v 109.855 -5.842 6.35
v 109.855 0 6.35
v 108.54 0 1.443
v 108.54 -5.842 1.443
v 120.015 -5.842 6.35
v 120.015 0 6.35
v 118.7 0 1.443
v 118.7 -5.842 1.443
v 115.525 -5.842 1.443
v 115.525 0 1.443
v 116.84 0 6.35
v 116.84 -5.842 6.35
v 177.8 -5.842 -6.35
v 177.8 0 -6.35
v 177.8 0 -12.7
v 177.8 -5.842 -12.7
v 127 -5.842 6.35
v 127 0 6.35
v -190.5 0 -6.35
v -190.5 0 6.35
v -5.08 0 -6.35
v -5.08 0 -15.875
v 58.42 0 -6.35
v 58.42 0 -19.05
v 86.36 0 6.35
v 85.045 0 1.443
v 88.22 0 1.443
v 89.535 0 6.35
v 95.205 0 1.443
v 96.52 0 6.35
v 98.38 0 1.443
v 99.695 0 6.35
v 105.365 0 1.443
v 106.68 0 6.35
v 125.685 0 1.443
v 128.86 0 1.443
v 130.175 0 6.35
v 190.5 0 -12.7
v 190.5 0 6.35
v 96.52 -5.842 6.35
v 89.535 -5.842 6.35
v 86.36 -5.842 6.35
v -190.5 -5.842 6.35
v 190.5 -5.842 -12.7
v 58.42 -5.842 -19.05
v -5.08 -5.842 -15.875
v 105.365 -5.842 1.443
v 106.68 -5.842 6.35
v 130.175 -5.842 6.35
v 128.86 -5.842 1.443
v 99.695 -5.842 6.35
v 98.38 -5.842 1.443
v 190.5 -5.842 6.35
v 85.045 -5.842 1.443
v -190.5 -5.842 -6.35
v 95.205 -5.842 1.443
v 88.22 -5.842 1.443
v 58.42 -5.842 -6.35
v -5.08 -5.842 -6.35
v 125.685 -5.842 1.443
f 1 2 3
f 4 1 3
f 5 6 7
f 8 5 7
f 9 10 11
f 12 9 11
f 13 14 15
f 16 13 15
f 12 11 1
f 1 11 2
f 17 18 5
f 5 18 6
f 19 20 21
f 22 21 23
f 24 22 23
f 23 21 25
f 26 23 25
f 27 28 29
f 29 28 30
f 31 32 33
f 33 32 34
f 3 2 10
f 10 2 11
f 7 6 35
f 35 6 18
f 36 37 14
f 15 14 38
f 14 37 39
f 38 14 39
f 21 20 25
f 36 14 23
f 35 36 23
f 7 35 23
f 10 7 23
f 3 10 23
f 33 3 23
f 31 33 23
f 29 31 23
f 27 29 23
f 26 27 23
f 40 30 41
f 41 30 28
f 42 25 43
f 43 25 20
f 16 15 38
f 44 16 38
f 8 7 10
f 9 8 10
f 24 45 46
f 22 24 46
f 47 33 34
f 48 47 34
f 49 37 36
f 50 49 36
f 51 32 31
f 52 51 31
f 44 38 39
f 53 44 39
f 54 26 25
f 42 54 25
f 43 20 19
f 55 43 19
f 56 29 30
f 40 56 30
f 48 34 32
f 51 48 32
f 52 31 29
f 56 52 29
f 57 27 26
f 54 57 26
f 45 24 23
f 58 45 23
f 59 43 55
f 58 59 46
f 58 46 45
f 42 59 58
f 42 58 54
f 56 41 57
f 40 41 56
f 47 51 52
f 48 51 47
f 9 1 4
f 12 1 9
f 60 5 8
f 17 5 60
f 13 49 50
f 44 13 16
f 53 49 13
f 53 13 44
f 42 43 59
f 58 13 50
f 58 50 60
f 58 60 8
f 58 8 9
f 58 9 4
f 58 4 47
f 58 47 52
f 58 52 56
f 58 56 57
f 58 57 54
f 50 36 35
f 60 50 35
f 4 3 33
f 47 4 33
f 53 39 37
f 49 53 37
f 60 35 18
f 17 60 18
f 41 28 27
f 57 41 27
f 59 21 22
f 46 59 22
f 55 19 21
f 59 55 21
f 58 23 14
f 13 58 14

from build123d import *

# Parameters (mm, degrees)
F1_DEPTH = 5.842
F3_DEPTH = 25.4


with BuildPart() as f1:
    # F0 (on Front) → F1 (new body)
    with BuildSketch(Plane.XZ):
        Polygon((86.36, 6.35), (-190.5, 6.35), (-190.5, -6.35), (-5.08, -6.35), (-5.08, -19.05), (58.42, -19.05), (58.42, -6.35), (177.8, -6.35), (177.8, -12.7), (190.5, -12.7), (190.5, -6.35), (190.5, 6.35), (130.175, 6.35), (128.860199, 1.443097), (125.685199, 1.443097), (127, 6.35), (120.015, 6.35), (118.700199, 1.443097), (115.525199, 1.443097), (116.84, 6.35), (109.855, 6.35), (108.540199, 1.443097), (105.365199, 1.443097), (106.68, 6.35), (99.695, 6.35), (98.380199, 1.443097), (95.205199, 1.443097), (96.52, 6.35), (89.535, 6.35), (88.220199, 1.443097), (85.045199, 1.443097), align=None)
    extrude(amount=F1_DEPTH)

    # F2 (on face) → F3 (cut)
    with BuildSketch(Plane.XZ.offset(5.842)):
        Polygon((58.42, -19.05), (-5.08, -15.875), (-5.08, -19.05), align=None)
    extrude(amount=-F3_DEPTH, mode=Mode.SUBTRACT)


solid = f1.part
